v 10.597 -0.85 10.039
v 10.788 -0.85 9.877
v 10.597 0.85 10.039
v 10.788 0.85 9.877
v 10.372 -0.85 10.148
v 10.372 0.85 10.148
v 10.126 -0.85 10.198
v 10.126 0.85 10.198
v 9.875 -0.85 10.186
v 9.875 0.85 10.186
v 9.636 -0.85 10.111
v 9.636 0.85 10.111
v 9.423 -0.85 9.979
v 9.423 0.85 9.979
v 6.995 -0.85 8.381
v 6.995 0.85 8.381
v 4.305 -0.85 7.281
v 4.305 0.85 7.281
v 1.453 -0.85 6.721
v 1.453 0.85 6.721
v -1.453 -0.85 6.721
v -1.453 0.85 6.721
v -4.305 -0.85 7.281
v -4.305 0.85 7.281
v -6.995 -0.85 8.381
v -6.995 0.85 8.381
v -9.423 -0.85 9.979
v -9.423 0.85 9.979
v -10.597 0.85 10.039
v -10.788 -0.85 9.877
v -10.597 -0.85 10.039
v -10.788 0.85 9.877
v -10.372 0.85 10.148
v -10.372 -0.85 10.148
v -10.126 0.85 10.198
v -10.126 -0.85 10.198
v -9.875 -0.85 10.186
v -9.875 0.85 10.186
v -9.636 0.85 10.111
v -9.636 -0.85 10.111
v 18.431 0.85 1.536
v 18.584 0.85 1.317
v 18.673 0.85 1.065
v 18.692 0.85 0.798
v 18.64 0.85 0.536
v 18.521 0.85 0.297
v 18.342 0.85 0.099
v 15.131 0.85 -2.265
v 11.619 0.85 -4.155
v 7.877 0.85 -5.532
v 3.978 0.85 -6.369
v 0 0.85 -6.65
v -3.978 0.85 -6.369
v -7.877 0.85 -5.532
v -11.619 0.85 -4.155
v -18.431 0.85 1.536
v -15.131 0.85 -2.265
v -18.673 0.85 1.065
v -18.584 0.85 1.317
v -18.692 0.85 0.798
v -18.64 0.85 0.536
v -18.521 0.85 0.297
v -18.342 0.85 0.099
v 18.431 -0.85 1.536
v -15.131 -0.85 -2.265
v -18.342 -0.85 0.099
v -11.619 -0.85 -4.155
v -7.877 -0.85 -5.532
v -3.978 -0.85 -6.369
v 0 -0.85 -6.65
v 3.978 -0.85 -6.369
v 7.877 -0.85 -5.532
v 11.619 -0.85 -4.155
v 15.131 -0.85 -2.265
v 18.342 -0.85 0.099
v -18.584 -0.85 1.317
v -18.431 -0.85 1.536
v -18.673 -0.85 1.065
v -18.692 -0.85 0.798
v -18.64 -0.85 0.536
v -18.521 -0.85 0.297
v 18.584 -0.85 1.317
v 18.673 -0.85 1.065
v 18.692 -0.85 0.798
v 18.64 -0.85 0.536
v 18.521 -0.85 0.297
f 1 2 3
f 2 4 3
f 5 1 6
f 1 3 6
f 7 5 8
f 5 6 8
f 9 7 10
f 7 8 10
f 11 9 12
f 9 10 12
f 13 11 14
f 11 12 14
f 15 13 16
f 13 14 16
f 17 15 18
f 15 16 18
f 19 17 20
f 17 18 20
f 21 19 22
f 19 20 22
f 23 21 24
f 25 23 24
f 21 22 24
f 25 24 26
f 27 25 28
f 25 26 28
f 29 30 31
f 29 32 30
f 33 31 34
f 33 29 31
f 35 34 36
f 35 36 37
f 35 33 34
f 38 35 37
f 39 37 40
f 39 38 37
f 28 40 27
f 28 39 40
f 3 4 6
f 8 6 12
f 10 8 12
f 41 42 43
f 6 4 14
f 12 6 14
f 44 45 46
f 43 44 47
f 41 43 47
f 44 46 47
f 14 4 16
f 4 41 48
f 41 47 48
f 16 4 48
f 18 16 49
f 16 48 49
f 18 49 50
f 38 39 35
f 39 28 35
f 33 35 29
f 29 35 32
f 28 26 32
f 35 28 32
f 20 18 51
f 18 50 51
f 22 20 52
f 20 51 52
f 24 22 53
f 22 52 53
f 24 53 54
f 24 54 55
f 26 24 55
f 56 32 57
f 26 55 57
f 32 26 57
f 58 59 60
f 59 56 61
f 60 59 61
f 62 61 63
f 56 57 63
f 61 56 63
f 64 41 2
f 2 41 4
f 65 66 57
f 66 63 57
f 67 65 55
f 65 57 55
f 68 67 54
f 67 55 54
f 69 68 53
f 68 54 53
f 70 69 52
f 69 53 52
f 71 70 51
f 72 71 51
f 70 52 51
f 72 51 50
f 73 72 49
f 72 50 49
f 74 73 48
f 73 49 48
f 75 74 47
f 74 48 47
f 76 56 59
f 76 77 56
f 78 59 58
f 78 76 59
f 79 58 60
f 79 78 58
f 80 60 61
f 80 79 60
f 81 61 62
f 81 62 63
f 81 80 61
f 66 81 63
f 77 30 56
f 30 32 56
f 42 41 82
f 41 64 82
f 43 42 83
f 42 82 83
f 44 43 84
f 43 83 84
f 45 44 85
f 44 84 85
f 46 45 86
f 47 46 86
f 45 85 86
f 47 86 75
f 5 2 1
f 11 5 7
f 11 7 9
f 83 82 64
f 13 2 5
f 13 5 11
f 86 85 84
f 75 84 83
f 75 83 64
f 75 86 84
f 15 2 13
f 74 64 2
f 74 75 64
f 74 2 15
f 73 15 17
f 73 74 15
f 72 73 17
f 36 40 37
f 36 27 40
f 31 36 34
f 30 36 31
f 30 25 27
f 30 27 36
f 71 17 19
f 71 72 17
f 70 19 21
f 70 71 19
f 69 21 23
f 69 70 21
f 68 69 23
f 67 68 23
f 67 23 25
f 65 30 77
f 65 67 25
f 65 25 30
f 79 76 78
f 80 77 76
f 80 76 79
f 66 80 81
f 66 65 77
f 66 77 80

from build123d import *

# Parameters (mm, degrees)
BOSS_EXTRUDE1_DEPTH = 0.85
FILLET1_R           = 1


with BuildPart() as part:
    # Sketch1 → Boss-Extrude1 (new, symmetric)
    with BuildSketch(Plane(origin=(0, 0, 0), x_dir=(1, 0, 0), z_dir=(0, 1, 0))):
        with BuildLine():
            Line((-10.133853114, -10.590839948), (-19.119202876, -0.785051368))
            ThreePointArc((-19.119202876, -0.785051368), (0, 6.65), (19.119202876, -0.785051368))
            Line((19.119202876, -0.785051368), (10.133853114, -10.590839948))
            ThreePointArc((10.133853114, -10.590839948), (0, -6.65), (-10.133853114, -10.590839948))
        make_face()
    extrude(amount=BOSS_EXTRUDE1_DEPTH, both=True)

    # Fillet1
    fillet1_edges = [part.edges().sort_by_distance(p)[0] for p in [
        (-10.133853114, 0, 10.590839948),
        (-19.119202876, 0, 0.785051368),
        (19.119202876, 0, 0.785051368),
        (10.133853114, 0, 10.590839948),
    ]]
    fillet(fillet1_edges, radius=FILLET1_R)


solid = part.part
